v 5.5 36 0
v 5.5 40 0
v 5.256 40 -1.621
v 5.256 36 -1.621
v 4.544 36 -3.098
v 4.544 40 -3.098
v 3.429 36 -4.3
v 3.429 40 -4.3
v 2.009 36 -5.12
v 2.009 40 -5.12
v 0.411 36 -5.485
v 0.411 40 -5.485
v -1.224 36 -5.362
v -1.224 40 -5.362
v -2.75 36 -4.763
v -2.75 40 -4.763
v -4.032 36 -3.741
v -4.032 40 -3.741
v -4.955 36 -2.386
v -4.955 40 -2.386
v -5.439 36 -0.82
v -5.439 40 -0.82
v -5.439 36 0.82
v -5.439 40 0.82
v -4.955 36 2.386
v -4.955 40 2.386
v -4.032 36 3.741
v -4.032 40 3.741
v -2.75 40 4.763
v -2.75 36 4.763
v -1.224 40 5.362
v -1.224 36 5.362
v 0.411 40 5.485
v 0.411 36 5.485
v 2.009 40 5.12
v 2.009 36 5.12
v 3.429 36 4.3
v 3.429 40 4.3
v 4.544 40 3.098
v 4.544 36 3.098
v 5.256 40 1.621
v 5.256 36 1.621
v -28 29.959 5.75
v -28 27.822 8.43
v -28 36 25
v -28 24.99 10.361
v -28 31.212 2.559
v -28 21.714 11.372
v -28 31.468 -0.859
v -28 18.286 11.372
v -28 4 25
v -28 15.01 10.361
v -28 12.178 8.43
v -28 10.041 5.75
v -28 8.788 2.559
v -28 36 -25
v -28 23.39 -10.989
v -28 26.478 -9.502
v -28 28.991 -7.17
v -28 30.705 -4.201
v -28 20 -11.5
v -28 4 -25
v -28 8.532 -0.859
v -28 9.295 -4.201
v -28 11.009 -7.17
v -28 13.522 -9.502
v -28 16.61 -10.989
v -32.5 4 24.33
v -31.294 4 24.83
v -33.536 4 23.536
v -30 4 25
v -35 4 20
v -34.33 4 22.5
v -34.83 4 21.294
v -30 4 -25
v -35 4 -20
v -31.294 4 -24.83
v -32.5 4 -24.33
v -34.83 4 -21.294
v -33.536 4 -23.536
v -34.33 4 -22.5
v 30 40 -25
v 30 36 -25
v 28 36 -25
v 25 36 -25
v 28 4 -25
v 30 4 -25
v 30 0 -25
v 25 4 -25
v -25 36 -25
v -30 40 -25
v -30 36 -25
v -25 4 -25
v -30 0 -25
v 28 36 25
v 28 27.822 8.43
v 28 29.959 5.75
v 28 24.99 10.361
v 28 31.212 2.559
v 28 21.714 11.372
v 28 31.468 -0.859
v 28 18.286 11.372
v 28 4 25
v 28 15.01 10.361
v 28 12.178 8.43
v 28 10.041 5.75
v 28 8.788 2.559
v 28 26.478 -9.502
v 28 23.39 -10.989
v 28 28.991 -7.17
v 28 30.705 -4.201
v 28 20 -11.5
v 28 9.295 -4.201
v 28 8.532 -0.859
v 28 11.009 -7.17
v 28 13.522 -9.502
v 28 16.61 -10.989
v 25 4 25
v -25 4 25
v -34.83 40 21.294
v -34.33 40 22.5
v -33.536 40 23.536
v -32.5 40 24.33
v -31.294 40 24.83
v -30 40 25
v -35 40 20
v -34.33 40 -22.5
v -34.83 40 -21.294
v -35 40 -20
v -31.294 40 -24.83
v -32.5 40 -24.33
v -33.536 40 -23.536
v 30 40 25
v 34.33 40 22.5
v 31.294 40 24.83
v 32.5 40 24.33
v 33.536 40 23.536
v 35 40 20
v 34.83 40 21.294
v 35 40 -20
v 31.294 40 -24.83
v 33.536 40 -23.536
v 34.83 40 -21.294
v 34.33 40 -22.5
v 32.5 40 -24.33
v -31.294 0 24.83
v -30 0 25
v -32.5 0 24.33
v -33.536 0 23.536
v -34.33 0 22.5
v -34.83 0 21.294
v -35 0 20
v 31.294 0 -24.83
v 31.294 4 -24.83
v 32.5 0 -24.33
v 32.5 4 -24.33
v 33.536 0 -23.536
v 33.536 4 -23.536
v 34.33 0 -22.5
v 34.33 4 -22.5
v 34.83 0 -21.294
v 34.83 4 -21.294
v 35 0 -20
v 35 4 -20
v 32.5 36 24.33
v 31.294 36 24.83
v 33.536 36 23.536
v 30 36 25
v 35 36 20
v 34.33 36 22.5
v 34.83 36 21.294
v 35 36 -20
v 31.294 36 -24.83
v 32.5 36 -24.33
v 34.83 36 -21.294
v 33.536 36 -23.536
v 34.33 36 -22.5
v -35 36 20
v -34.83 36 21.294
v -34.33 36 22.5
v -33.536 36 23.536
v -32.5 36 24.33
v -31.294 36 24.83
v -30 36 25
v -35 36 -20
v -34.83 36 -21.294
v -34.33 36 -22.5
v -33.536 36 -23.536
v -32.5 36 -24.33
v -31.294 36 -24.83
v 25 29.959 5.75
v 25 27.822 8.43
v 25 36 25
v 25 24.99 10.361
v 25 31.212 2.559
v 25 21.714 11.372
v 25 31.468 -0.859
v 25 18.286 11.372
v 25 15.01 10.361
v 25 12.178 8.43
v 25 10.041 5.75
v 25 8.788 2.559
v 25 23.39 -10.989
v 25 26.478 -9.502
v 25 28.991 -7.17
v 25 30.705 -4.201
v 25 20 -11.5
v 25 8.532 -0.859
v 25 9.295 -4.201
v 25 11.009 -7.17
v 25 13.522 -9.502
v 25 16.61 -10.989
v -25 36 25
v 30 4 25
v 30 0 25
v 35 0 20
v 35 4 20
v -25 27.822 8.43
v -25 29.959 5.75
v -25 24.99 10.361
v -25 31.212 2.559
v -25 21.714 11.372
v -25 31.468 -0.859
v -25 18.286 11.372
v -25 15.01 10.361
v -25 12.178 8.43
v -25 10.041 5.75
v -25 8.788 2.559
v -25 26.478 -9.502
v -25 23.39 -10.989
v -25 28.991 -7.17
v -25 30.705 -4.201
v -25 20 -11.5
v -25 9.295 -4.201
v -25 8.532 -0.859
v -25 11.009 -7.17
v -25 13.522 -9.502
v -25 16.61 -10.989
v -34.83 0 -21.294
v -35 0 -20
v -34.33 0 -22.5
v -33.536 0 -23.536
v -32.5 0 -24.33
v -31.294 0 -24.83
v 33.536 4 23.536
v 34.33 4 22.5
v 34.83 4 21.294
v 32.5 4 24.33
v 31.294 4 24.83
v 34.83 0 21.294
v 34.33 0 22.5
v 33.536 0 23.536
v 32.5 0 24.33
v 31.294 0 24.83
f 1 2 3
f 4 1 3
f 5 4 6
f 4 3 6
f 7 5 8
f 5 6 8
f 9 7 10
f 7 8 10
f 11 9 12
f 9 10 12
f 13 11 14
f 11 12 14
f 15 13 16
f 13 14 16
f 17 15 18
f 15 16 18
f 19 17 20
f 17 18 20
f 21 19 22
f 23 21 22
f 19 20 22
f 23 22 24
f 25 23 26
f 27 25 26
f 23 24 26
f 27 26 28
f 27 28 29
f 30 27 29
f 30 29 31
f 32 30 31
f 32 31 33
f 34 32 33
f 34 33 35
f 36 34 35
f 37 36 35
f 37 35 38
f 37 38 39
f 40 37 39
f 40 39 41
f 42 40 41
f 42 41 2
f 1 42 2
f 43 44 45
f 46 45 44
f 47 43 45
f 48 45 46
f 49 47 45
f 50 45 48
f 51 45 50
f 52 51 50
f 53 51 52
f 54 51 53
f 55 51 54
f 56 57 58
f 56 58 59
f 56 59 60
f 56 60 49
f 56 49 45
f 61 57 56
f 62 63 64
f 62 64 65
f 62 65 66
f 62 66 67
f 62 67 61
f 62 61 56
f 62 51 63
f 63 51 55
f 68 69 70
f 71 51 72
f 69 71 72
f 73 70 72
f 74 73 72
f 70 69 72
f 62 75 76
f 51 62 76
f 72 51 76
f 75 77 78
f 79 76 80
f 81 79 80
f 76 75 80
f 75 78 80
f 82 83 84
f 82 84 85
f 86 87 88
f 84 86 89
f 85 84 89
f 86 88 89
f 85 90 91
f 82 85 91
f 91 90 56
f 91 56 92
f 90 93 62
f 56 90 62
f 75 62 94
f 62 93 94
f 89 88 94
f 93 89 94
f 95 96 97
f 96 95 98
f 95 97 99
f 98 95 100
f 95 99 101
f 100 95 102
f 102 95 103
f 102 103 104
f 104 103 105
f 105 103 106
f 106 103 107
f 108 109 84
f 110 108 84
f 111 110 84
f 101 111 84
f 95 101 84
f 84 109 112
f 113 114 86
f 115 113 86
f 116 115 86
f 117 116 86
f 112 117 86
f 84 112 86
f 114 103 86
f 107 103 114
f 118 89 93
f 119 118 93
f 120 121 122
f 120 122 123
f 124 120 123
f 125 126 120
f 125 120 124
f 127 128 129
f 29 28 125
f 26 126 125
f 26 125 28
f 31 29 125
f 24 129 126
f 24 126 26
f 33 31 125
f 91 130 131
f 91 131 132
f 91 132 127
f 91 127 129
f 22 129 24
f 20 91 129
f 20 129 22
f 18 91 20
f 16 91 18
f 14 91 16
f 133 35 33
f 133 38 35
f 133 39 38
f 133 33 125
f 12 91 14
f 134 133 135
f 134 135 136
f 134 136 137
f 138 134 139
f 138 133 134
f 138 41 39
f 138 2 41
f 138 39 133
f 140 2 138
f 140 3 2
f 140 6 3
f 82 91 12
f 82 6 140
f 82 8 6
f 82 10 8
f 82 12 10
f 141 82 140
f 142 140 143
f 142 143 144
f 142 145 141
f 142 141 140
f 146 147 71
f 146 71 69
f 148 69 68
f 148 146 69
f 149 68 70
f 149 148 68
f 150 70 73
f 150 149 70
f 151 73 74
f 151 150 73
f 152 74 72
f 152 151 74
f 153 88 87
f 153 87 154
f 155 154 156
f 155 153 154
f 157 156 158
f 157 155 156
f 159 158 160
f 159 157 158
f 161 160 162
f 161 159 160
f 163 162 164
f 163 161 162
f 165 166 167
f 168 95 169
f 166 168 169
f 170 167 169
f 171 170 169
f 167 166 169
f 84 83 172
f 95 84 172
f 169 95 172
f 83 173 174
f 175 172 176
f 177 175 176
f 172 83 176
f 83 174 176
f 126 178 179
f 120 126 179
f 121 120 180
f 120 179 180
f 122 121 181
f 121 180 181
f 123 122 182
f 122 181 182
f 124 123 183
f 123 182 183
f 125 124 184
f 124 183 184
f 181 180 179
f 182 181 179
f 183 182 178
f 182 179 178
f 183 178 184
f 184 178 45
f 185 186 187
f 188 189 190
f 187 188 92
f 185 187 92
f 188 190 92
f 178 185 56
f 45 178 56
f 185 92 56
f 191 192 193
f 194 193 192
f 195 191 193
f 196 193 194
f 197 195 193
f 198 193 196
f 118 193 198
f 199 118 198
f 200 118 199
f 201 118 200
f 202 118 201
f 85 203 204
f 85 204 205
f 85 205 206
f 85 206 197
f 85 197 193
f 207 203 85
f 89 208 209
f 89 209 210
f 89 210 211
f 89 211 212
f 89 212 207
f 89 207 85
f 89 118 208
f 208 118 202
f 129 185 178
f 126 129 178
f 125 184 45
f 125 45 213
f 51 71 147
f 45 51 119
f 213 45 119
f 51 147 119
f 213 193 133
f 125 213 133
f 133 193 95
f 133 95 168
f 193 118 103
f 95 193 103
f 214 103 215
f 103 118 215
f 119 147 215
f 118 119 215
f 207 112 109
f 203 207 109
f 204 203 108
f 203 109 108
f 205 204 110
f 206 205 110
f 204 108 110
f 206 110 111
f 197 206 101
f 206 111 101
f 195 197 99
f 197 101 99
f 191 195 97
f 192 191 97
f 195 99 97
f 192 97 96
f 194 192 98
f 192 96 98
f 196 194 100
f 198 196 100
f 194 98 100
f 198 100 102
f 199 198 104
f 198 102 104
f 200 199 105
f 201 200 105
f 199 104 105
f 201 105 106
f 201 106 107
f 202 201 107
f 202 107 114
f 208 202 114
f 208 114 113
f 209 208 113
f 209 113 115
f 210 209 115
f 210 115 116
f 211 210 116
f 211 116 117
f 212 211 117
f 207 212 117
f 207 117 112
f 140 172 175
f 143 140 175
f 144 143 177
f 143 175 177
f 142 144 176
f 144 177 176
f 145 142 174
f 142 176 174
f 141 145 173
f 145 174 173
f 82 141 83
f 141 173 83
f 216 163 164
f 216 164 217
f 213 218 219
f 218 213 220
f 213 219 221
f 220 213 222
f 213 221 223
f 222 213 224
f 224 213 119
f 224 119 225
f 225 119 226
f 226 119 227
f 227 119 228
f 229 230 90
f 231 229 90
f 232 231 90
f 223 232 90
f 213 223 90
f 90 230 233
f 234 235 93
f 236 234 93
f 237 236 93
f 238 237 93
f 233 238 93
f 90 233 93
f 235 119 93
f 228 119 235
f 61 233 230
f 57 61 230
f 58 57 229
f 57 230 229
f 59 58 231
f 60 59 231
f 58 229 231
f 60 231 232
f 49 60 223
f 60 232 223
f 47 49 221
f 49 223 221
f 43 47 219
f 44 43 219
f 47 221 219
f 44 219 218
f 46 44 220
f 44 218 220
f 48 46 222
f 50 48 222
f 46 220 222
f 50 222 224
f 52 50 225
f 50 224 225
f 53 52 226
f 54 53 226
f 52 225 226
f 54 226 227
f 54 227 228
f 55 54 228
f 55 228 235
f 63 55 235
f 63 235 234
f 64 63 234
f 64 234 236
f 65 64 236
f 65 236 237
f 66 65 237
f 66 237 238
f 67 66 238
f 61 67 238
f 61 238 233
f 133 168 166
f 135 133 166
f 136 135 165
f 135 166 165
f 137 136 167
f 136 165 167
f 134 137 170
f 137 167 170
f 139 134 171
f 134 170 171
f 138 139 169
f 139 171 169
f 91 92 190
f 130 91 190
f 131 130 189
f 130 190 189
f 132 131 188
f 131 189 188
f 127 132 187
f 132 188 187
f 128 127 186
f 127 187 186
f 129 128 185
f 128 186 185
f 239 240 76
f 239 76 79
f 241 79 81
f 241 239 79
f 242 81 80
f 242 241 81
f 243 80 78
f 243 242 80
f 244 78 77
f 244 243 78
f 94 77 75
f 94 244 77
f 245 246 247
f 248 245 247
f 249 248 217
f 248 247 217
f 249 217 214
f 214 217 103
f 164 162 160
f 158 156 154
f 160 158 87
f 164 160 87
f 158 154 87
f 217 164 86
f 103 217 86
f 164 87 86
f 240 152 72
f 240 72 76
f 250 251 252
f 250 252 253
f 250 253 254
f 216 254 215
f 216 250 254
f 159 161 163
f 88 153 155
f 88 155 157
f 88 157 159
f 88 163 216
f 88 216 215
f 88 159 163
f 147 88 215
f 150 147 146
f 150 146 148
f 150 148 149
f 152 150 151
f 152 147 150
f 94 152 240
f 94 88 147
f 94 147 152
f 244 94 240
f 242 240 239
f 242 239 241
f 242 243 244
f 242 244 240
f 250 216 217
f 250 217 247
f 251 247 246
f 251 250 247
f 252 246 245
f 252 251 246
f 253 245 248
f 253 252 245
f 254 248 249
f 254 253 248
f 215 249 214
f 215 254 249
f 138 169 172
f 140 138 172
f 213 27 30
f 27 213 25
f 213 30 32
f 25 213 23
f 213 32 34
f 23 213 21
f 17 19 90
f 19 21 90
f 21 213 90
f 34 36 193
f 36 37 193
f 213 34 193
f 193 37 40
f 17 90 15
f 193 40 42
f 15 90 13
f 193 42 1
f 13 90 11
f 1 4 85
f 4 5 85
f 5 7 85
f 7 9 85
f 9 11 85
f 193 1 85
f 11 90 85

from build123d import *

# Parameters (mm, degrees)
BOSS_EXTRUDE1_DEPTH = 4
SKETCH2_W           = 3
SKETCH2_H           = 50
BOSS_EXTRUDE4_DEPTH = 32
SKETCH4_W           = 50
SKETCH4_H           = 50
SKETCH4_W_2         = 3
BOSS_EXTRUDE5_DEPTH = 4
SKETCH6_R           = 11.5
CUT_EXTRUDE1_DEPTH  = 106
SKETCH7_R           = 5.5
CUT_EXTRUDE2_DEPTH  = 10


with BuildPart() as part:
    # Sketch1 → Boss-Extrude1 (new body)
    with BuildSketch(Plane(origin=(0, 0, 0), x_dir=(1, 0, 0), z_dir=(0, 1, 0))):
        with BuildLine():
            Line((-30, 25), (30, 25))
            ThreePointArc((30, 25), (33.535533906, 23.535533906), (35, 20))
            Line((35, 20), (35, -20))
            ThreePointArc((35, -20), (33.535533906, -23.535533906), (30, -25))
            Line((30, -25), (-30, -25))
            ThreePointArc((-30, -25), (-33.535533906, -23.535533906), (-35, -20))
            Line((-35, -20), (-35, 20))
            ThreePointArc((-35, 20), (-33.535533906, 23.535533906), (-30, 25))
        make_face()
    extrude(amount=BOSS_EXTRUDE1_DEPTH)

    # Sketch2 → Boss-Extrude4 (add)
    with BuildSketch(Plane(origin=(0, 4, 0), x_dir=(1, 0, 0), z_dir=(0, 1, 0))):
        with Locations((-26.5, 0)):
            Rectangle(SKETCH2_W, SKETCH2_H)
        with Locations((26.5, 0)):
            Rectangle(SKETCH2_W, SKETCH2_H)
    extrude(amount=BOSS_EXTRUDE4_DEPTH)

    # Sketch4 → Boss-Extrude5 (add)
    with BuildSketch(Plane(origin=(0, 36, 0), x_dir=(1, 0, 0), z_dir=(0, 1, 0))):
        Rectangle(SKETCH4_W, SKETCH4_H)
        with BuildLine():
            Line((-35, 20), (-35, -20))
            ThreePointArc((-35, -20), (-33.535533906, -23.535533906), (-30, -25))
            Line((-30, -25), (-28, -25))
            Line((-28, -25), (-28, 25))
            Line((-28, 25), (-30, 25))
            ThreePointArc((-30, 25), (-33.535533906, 23.535533906), (-35, 20))
        make_face()
        with BuildLine():
            Line((35, -20), (35, 20))
            ThreePointArc((35, 20), (33.535533906, 23.535533906), (30, 25))
            Line((30, 25), (28, 25))
            Line((28, 25), (28, -25))
            Line((28, -25), (30, -25))
            ThreePointArc((30, -25), (33.535533906, -23.535533906), (35, -20))
        make_face()
        with Locations((26.5, 0)):
            Rectangle(SKETCH4_W_2, SKETCH4_H)
        with Locations((-26.5, 0)):
            Rectangle(SKETCH4_W_2, SKETCH4_H)
    extrude(amount=BOSS_EXTRUDE5_DEPTH)

    # Sketch6 → Cut-Extrude1 (cut)
    with BuildSketch(Plane(origin=(28, 0, 0), x_dir=(0, 0, -1), z_dir=(1, 0, 0))):
        with Locations((0, 20)):
            Circle(SKETCH6_R)
    extrude(amount=-CUT_EXTRUDE1_DEPTH, mode=Mode.SUBTRACT)

    # Sketch7 → Cut-Extrude2 (cut)
    with BuildSketch(Plane(origin=(0, 40, 0), x_dir=(1, 0, 0), z_dir=(0, 1, 0))):
        Circle(SKETCH7_R)
    extrude(amount=-CUT_EXTRUDE2_DEPTH, mode=Mode.SUBTRACT)


solid = part.part
